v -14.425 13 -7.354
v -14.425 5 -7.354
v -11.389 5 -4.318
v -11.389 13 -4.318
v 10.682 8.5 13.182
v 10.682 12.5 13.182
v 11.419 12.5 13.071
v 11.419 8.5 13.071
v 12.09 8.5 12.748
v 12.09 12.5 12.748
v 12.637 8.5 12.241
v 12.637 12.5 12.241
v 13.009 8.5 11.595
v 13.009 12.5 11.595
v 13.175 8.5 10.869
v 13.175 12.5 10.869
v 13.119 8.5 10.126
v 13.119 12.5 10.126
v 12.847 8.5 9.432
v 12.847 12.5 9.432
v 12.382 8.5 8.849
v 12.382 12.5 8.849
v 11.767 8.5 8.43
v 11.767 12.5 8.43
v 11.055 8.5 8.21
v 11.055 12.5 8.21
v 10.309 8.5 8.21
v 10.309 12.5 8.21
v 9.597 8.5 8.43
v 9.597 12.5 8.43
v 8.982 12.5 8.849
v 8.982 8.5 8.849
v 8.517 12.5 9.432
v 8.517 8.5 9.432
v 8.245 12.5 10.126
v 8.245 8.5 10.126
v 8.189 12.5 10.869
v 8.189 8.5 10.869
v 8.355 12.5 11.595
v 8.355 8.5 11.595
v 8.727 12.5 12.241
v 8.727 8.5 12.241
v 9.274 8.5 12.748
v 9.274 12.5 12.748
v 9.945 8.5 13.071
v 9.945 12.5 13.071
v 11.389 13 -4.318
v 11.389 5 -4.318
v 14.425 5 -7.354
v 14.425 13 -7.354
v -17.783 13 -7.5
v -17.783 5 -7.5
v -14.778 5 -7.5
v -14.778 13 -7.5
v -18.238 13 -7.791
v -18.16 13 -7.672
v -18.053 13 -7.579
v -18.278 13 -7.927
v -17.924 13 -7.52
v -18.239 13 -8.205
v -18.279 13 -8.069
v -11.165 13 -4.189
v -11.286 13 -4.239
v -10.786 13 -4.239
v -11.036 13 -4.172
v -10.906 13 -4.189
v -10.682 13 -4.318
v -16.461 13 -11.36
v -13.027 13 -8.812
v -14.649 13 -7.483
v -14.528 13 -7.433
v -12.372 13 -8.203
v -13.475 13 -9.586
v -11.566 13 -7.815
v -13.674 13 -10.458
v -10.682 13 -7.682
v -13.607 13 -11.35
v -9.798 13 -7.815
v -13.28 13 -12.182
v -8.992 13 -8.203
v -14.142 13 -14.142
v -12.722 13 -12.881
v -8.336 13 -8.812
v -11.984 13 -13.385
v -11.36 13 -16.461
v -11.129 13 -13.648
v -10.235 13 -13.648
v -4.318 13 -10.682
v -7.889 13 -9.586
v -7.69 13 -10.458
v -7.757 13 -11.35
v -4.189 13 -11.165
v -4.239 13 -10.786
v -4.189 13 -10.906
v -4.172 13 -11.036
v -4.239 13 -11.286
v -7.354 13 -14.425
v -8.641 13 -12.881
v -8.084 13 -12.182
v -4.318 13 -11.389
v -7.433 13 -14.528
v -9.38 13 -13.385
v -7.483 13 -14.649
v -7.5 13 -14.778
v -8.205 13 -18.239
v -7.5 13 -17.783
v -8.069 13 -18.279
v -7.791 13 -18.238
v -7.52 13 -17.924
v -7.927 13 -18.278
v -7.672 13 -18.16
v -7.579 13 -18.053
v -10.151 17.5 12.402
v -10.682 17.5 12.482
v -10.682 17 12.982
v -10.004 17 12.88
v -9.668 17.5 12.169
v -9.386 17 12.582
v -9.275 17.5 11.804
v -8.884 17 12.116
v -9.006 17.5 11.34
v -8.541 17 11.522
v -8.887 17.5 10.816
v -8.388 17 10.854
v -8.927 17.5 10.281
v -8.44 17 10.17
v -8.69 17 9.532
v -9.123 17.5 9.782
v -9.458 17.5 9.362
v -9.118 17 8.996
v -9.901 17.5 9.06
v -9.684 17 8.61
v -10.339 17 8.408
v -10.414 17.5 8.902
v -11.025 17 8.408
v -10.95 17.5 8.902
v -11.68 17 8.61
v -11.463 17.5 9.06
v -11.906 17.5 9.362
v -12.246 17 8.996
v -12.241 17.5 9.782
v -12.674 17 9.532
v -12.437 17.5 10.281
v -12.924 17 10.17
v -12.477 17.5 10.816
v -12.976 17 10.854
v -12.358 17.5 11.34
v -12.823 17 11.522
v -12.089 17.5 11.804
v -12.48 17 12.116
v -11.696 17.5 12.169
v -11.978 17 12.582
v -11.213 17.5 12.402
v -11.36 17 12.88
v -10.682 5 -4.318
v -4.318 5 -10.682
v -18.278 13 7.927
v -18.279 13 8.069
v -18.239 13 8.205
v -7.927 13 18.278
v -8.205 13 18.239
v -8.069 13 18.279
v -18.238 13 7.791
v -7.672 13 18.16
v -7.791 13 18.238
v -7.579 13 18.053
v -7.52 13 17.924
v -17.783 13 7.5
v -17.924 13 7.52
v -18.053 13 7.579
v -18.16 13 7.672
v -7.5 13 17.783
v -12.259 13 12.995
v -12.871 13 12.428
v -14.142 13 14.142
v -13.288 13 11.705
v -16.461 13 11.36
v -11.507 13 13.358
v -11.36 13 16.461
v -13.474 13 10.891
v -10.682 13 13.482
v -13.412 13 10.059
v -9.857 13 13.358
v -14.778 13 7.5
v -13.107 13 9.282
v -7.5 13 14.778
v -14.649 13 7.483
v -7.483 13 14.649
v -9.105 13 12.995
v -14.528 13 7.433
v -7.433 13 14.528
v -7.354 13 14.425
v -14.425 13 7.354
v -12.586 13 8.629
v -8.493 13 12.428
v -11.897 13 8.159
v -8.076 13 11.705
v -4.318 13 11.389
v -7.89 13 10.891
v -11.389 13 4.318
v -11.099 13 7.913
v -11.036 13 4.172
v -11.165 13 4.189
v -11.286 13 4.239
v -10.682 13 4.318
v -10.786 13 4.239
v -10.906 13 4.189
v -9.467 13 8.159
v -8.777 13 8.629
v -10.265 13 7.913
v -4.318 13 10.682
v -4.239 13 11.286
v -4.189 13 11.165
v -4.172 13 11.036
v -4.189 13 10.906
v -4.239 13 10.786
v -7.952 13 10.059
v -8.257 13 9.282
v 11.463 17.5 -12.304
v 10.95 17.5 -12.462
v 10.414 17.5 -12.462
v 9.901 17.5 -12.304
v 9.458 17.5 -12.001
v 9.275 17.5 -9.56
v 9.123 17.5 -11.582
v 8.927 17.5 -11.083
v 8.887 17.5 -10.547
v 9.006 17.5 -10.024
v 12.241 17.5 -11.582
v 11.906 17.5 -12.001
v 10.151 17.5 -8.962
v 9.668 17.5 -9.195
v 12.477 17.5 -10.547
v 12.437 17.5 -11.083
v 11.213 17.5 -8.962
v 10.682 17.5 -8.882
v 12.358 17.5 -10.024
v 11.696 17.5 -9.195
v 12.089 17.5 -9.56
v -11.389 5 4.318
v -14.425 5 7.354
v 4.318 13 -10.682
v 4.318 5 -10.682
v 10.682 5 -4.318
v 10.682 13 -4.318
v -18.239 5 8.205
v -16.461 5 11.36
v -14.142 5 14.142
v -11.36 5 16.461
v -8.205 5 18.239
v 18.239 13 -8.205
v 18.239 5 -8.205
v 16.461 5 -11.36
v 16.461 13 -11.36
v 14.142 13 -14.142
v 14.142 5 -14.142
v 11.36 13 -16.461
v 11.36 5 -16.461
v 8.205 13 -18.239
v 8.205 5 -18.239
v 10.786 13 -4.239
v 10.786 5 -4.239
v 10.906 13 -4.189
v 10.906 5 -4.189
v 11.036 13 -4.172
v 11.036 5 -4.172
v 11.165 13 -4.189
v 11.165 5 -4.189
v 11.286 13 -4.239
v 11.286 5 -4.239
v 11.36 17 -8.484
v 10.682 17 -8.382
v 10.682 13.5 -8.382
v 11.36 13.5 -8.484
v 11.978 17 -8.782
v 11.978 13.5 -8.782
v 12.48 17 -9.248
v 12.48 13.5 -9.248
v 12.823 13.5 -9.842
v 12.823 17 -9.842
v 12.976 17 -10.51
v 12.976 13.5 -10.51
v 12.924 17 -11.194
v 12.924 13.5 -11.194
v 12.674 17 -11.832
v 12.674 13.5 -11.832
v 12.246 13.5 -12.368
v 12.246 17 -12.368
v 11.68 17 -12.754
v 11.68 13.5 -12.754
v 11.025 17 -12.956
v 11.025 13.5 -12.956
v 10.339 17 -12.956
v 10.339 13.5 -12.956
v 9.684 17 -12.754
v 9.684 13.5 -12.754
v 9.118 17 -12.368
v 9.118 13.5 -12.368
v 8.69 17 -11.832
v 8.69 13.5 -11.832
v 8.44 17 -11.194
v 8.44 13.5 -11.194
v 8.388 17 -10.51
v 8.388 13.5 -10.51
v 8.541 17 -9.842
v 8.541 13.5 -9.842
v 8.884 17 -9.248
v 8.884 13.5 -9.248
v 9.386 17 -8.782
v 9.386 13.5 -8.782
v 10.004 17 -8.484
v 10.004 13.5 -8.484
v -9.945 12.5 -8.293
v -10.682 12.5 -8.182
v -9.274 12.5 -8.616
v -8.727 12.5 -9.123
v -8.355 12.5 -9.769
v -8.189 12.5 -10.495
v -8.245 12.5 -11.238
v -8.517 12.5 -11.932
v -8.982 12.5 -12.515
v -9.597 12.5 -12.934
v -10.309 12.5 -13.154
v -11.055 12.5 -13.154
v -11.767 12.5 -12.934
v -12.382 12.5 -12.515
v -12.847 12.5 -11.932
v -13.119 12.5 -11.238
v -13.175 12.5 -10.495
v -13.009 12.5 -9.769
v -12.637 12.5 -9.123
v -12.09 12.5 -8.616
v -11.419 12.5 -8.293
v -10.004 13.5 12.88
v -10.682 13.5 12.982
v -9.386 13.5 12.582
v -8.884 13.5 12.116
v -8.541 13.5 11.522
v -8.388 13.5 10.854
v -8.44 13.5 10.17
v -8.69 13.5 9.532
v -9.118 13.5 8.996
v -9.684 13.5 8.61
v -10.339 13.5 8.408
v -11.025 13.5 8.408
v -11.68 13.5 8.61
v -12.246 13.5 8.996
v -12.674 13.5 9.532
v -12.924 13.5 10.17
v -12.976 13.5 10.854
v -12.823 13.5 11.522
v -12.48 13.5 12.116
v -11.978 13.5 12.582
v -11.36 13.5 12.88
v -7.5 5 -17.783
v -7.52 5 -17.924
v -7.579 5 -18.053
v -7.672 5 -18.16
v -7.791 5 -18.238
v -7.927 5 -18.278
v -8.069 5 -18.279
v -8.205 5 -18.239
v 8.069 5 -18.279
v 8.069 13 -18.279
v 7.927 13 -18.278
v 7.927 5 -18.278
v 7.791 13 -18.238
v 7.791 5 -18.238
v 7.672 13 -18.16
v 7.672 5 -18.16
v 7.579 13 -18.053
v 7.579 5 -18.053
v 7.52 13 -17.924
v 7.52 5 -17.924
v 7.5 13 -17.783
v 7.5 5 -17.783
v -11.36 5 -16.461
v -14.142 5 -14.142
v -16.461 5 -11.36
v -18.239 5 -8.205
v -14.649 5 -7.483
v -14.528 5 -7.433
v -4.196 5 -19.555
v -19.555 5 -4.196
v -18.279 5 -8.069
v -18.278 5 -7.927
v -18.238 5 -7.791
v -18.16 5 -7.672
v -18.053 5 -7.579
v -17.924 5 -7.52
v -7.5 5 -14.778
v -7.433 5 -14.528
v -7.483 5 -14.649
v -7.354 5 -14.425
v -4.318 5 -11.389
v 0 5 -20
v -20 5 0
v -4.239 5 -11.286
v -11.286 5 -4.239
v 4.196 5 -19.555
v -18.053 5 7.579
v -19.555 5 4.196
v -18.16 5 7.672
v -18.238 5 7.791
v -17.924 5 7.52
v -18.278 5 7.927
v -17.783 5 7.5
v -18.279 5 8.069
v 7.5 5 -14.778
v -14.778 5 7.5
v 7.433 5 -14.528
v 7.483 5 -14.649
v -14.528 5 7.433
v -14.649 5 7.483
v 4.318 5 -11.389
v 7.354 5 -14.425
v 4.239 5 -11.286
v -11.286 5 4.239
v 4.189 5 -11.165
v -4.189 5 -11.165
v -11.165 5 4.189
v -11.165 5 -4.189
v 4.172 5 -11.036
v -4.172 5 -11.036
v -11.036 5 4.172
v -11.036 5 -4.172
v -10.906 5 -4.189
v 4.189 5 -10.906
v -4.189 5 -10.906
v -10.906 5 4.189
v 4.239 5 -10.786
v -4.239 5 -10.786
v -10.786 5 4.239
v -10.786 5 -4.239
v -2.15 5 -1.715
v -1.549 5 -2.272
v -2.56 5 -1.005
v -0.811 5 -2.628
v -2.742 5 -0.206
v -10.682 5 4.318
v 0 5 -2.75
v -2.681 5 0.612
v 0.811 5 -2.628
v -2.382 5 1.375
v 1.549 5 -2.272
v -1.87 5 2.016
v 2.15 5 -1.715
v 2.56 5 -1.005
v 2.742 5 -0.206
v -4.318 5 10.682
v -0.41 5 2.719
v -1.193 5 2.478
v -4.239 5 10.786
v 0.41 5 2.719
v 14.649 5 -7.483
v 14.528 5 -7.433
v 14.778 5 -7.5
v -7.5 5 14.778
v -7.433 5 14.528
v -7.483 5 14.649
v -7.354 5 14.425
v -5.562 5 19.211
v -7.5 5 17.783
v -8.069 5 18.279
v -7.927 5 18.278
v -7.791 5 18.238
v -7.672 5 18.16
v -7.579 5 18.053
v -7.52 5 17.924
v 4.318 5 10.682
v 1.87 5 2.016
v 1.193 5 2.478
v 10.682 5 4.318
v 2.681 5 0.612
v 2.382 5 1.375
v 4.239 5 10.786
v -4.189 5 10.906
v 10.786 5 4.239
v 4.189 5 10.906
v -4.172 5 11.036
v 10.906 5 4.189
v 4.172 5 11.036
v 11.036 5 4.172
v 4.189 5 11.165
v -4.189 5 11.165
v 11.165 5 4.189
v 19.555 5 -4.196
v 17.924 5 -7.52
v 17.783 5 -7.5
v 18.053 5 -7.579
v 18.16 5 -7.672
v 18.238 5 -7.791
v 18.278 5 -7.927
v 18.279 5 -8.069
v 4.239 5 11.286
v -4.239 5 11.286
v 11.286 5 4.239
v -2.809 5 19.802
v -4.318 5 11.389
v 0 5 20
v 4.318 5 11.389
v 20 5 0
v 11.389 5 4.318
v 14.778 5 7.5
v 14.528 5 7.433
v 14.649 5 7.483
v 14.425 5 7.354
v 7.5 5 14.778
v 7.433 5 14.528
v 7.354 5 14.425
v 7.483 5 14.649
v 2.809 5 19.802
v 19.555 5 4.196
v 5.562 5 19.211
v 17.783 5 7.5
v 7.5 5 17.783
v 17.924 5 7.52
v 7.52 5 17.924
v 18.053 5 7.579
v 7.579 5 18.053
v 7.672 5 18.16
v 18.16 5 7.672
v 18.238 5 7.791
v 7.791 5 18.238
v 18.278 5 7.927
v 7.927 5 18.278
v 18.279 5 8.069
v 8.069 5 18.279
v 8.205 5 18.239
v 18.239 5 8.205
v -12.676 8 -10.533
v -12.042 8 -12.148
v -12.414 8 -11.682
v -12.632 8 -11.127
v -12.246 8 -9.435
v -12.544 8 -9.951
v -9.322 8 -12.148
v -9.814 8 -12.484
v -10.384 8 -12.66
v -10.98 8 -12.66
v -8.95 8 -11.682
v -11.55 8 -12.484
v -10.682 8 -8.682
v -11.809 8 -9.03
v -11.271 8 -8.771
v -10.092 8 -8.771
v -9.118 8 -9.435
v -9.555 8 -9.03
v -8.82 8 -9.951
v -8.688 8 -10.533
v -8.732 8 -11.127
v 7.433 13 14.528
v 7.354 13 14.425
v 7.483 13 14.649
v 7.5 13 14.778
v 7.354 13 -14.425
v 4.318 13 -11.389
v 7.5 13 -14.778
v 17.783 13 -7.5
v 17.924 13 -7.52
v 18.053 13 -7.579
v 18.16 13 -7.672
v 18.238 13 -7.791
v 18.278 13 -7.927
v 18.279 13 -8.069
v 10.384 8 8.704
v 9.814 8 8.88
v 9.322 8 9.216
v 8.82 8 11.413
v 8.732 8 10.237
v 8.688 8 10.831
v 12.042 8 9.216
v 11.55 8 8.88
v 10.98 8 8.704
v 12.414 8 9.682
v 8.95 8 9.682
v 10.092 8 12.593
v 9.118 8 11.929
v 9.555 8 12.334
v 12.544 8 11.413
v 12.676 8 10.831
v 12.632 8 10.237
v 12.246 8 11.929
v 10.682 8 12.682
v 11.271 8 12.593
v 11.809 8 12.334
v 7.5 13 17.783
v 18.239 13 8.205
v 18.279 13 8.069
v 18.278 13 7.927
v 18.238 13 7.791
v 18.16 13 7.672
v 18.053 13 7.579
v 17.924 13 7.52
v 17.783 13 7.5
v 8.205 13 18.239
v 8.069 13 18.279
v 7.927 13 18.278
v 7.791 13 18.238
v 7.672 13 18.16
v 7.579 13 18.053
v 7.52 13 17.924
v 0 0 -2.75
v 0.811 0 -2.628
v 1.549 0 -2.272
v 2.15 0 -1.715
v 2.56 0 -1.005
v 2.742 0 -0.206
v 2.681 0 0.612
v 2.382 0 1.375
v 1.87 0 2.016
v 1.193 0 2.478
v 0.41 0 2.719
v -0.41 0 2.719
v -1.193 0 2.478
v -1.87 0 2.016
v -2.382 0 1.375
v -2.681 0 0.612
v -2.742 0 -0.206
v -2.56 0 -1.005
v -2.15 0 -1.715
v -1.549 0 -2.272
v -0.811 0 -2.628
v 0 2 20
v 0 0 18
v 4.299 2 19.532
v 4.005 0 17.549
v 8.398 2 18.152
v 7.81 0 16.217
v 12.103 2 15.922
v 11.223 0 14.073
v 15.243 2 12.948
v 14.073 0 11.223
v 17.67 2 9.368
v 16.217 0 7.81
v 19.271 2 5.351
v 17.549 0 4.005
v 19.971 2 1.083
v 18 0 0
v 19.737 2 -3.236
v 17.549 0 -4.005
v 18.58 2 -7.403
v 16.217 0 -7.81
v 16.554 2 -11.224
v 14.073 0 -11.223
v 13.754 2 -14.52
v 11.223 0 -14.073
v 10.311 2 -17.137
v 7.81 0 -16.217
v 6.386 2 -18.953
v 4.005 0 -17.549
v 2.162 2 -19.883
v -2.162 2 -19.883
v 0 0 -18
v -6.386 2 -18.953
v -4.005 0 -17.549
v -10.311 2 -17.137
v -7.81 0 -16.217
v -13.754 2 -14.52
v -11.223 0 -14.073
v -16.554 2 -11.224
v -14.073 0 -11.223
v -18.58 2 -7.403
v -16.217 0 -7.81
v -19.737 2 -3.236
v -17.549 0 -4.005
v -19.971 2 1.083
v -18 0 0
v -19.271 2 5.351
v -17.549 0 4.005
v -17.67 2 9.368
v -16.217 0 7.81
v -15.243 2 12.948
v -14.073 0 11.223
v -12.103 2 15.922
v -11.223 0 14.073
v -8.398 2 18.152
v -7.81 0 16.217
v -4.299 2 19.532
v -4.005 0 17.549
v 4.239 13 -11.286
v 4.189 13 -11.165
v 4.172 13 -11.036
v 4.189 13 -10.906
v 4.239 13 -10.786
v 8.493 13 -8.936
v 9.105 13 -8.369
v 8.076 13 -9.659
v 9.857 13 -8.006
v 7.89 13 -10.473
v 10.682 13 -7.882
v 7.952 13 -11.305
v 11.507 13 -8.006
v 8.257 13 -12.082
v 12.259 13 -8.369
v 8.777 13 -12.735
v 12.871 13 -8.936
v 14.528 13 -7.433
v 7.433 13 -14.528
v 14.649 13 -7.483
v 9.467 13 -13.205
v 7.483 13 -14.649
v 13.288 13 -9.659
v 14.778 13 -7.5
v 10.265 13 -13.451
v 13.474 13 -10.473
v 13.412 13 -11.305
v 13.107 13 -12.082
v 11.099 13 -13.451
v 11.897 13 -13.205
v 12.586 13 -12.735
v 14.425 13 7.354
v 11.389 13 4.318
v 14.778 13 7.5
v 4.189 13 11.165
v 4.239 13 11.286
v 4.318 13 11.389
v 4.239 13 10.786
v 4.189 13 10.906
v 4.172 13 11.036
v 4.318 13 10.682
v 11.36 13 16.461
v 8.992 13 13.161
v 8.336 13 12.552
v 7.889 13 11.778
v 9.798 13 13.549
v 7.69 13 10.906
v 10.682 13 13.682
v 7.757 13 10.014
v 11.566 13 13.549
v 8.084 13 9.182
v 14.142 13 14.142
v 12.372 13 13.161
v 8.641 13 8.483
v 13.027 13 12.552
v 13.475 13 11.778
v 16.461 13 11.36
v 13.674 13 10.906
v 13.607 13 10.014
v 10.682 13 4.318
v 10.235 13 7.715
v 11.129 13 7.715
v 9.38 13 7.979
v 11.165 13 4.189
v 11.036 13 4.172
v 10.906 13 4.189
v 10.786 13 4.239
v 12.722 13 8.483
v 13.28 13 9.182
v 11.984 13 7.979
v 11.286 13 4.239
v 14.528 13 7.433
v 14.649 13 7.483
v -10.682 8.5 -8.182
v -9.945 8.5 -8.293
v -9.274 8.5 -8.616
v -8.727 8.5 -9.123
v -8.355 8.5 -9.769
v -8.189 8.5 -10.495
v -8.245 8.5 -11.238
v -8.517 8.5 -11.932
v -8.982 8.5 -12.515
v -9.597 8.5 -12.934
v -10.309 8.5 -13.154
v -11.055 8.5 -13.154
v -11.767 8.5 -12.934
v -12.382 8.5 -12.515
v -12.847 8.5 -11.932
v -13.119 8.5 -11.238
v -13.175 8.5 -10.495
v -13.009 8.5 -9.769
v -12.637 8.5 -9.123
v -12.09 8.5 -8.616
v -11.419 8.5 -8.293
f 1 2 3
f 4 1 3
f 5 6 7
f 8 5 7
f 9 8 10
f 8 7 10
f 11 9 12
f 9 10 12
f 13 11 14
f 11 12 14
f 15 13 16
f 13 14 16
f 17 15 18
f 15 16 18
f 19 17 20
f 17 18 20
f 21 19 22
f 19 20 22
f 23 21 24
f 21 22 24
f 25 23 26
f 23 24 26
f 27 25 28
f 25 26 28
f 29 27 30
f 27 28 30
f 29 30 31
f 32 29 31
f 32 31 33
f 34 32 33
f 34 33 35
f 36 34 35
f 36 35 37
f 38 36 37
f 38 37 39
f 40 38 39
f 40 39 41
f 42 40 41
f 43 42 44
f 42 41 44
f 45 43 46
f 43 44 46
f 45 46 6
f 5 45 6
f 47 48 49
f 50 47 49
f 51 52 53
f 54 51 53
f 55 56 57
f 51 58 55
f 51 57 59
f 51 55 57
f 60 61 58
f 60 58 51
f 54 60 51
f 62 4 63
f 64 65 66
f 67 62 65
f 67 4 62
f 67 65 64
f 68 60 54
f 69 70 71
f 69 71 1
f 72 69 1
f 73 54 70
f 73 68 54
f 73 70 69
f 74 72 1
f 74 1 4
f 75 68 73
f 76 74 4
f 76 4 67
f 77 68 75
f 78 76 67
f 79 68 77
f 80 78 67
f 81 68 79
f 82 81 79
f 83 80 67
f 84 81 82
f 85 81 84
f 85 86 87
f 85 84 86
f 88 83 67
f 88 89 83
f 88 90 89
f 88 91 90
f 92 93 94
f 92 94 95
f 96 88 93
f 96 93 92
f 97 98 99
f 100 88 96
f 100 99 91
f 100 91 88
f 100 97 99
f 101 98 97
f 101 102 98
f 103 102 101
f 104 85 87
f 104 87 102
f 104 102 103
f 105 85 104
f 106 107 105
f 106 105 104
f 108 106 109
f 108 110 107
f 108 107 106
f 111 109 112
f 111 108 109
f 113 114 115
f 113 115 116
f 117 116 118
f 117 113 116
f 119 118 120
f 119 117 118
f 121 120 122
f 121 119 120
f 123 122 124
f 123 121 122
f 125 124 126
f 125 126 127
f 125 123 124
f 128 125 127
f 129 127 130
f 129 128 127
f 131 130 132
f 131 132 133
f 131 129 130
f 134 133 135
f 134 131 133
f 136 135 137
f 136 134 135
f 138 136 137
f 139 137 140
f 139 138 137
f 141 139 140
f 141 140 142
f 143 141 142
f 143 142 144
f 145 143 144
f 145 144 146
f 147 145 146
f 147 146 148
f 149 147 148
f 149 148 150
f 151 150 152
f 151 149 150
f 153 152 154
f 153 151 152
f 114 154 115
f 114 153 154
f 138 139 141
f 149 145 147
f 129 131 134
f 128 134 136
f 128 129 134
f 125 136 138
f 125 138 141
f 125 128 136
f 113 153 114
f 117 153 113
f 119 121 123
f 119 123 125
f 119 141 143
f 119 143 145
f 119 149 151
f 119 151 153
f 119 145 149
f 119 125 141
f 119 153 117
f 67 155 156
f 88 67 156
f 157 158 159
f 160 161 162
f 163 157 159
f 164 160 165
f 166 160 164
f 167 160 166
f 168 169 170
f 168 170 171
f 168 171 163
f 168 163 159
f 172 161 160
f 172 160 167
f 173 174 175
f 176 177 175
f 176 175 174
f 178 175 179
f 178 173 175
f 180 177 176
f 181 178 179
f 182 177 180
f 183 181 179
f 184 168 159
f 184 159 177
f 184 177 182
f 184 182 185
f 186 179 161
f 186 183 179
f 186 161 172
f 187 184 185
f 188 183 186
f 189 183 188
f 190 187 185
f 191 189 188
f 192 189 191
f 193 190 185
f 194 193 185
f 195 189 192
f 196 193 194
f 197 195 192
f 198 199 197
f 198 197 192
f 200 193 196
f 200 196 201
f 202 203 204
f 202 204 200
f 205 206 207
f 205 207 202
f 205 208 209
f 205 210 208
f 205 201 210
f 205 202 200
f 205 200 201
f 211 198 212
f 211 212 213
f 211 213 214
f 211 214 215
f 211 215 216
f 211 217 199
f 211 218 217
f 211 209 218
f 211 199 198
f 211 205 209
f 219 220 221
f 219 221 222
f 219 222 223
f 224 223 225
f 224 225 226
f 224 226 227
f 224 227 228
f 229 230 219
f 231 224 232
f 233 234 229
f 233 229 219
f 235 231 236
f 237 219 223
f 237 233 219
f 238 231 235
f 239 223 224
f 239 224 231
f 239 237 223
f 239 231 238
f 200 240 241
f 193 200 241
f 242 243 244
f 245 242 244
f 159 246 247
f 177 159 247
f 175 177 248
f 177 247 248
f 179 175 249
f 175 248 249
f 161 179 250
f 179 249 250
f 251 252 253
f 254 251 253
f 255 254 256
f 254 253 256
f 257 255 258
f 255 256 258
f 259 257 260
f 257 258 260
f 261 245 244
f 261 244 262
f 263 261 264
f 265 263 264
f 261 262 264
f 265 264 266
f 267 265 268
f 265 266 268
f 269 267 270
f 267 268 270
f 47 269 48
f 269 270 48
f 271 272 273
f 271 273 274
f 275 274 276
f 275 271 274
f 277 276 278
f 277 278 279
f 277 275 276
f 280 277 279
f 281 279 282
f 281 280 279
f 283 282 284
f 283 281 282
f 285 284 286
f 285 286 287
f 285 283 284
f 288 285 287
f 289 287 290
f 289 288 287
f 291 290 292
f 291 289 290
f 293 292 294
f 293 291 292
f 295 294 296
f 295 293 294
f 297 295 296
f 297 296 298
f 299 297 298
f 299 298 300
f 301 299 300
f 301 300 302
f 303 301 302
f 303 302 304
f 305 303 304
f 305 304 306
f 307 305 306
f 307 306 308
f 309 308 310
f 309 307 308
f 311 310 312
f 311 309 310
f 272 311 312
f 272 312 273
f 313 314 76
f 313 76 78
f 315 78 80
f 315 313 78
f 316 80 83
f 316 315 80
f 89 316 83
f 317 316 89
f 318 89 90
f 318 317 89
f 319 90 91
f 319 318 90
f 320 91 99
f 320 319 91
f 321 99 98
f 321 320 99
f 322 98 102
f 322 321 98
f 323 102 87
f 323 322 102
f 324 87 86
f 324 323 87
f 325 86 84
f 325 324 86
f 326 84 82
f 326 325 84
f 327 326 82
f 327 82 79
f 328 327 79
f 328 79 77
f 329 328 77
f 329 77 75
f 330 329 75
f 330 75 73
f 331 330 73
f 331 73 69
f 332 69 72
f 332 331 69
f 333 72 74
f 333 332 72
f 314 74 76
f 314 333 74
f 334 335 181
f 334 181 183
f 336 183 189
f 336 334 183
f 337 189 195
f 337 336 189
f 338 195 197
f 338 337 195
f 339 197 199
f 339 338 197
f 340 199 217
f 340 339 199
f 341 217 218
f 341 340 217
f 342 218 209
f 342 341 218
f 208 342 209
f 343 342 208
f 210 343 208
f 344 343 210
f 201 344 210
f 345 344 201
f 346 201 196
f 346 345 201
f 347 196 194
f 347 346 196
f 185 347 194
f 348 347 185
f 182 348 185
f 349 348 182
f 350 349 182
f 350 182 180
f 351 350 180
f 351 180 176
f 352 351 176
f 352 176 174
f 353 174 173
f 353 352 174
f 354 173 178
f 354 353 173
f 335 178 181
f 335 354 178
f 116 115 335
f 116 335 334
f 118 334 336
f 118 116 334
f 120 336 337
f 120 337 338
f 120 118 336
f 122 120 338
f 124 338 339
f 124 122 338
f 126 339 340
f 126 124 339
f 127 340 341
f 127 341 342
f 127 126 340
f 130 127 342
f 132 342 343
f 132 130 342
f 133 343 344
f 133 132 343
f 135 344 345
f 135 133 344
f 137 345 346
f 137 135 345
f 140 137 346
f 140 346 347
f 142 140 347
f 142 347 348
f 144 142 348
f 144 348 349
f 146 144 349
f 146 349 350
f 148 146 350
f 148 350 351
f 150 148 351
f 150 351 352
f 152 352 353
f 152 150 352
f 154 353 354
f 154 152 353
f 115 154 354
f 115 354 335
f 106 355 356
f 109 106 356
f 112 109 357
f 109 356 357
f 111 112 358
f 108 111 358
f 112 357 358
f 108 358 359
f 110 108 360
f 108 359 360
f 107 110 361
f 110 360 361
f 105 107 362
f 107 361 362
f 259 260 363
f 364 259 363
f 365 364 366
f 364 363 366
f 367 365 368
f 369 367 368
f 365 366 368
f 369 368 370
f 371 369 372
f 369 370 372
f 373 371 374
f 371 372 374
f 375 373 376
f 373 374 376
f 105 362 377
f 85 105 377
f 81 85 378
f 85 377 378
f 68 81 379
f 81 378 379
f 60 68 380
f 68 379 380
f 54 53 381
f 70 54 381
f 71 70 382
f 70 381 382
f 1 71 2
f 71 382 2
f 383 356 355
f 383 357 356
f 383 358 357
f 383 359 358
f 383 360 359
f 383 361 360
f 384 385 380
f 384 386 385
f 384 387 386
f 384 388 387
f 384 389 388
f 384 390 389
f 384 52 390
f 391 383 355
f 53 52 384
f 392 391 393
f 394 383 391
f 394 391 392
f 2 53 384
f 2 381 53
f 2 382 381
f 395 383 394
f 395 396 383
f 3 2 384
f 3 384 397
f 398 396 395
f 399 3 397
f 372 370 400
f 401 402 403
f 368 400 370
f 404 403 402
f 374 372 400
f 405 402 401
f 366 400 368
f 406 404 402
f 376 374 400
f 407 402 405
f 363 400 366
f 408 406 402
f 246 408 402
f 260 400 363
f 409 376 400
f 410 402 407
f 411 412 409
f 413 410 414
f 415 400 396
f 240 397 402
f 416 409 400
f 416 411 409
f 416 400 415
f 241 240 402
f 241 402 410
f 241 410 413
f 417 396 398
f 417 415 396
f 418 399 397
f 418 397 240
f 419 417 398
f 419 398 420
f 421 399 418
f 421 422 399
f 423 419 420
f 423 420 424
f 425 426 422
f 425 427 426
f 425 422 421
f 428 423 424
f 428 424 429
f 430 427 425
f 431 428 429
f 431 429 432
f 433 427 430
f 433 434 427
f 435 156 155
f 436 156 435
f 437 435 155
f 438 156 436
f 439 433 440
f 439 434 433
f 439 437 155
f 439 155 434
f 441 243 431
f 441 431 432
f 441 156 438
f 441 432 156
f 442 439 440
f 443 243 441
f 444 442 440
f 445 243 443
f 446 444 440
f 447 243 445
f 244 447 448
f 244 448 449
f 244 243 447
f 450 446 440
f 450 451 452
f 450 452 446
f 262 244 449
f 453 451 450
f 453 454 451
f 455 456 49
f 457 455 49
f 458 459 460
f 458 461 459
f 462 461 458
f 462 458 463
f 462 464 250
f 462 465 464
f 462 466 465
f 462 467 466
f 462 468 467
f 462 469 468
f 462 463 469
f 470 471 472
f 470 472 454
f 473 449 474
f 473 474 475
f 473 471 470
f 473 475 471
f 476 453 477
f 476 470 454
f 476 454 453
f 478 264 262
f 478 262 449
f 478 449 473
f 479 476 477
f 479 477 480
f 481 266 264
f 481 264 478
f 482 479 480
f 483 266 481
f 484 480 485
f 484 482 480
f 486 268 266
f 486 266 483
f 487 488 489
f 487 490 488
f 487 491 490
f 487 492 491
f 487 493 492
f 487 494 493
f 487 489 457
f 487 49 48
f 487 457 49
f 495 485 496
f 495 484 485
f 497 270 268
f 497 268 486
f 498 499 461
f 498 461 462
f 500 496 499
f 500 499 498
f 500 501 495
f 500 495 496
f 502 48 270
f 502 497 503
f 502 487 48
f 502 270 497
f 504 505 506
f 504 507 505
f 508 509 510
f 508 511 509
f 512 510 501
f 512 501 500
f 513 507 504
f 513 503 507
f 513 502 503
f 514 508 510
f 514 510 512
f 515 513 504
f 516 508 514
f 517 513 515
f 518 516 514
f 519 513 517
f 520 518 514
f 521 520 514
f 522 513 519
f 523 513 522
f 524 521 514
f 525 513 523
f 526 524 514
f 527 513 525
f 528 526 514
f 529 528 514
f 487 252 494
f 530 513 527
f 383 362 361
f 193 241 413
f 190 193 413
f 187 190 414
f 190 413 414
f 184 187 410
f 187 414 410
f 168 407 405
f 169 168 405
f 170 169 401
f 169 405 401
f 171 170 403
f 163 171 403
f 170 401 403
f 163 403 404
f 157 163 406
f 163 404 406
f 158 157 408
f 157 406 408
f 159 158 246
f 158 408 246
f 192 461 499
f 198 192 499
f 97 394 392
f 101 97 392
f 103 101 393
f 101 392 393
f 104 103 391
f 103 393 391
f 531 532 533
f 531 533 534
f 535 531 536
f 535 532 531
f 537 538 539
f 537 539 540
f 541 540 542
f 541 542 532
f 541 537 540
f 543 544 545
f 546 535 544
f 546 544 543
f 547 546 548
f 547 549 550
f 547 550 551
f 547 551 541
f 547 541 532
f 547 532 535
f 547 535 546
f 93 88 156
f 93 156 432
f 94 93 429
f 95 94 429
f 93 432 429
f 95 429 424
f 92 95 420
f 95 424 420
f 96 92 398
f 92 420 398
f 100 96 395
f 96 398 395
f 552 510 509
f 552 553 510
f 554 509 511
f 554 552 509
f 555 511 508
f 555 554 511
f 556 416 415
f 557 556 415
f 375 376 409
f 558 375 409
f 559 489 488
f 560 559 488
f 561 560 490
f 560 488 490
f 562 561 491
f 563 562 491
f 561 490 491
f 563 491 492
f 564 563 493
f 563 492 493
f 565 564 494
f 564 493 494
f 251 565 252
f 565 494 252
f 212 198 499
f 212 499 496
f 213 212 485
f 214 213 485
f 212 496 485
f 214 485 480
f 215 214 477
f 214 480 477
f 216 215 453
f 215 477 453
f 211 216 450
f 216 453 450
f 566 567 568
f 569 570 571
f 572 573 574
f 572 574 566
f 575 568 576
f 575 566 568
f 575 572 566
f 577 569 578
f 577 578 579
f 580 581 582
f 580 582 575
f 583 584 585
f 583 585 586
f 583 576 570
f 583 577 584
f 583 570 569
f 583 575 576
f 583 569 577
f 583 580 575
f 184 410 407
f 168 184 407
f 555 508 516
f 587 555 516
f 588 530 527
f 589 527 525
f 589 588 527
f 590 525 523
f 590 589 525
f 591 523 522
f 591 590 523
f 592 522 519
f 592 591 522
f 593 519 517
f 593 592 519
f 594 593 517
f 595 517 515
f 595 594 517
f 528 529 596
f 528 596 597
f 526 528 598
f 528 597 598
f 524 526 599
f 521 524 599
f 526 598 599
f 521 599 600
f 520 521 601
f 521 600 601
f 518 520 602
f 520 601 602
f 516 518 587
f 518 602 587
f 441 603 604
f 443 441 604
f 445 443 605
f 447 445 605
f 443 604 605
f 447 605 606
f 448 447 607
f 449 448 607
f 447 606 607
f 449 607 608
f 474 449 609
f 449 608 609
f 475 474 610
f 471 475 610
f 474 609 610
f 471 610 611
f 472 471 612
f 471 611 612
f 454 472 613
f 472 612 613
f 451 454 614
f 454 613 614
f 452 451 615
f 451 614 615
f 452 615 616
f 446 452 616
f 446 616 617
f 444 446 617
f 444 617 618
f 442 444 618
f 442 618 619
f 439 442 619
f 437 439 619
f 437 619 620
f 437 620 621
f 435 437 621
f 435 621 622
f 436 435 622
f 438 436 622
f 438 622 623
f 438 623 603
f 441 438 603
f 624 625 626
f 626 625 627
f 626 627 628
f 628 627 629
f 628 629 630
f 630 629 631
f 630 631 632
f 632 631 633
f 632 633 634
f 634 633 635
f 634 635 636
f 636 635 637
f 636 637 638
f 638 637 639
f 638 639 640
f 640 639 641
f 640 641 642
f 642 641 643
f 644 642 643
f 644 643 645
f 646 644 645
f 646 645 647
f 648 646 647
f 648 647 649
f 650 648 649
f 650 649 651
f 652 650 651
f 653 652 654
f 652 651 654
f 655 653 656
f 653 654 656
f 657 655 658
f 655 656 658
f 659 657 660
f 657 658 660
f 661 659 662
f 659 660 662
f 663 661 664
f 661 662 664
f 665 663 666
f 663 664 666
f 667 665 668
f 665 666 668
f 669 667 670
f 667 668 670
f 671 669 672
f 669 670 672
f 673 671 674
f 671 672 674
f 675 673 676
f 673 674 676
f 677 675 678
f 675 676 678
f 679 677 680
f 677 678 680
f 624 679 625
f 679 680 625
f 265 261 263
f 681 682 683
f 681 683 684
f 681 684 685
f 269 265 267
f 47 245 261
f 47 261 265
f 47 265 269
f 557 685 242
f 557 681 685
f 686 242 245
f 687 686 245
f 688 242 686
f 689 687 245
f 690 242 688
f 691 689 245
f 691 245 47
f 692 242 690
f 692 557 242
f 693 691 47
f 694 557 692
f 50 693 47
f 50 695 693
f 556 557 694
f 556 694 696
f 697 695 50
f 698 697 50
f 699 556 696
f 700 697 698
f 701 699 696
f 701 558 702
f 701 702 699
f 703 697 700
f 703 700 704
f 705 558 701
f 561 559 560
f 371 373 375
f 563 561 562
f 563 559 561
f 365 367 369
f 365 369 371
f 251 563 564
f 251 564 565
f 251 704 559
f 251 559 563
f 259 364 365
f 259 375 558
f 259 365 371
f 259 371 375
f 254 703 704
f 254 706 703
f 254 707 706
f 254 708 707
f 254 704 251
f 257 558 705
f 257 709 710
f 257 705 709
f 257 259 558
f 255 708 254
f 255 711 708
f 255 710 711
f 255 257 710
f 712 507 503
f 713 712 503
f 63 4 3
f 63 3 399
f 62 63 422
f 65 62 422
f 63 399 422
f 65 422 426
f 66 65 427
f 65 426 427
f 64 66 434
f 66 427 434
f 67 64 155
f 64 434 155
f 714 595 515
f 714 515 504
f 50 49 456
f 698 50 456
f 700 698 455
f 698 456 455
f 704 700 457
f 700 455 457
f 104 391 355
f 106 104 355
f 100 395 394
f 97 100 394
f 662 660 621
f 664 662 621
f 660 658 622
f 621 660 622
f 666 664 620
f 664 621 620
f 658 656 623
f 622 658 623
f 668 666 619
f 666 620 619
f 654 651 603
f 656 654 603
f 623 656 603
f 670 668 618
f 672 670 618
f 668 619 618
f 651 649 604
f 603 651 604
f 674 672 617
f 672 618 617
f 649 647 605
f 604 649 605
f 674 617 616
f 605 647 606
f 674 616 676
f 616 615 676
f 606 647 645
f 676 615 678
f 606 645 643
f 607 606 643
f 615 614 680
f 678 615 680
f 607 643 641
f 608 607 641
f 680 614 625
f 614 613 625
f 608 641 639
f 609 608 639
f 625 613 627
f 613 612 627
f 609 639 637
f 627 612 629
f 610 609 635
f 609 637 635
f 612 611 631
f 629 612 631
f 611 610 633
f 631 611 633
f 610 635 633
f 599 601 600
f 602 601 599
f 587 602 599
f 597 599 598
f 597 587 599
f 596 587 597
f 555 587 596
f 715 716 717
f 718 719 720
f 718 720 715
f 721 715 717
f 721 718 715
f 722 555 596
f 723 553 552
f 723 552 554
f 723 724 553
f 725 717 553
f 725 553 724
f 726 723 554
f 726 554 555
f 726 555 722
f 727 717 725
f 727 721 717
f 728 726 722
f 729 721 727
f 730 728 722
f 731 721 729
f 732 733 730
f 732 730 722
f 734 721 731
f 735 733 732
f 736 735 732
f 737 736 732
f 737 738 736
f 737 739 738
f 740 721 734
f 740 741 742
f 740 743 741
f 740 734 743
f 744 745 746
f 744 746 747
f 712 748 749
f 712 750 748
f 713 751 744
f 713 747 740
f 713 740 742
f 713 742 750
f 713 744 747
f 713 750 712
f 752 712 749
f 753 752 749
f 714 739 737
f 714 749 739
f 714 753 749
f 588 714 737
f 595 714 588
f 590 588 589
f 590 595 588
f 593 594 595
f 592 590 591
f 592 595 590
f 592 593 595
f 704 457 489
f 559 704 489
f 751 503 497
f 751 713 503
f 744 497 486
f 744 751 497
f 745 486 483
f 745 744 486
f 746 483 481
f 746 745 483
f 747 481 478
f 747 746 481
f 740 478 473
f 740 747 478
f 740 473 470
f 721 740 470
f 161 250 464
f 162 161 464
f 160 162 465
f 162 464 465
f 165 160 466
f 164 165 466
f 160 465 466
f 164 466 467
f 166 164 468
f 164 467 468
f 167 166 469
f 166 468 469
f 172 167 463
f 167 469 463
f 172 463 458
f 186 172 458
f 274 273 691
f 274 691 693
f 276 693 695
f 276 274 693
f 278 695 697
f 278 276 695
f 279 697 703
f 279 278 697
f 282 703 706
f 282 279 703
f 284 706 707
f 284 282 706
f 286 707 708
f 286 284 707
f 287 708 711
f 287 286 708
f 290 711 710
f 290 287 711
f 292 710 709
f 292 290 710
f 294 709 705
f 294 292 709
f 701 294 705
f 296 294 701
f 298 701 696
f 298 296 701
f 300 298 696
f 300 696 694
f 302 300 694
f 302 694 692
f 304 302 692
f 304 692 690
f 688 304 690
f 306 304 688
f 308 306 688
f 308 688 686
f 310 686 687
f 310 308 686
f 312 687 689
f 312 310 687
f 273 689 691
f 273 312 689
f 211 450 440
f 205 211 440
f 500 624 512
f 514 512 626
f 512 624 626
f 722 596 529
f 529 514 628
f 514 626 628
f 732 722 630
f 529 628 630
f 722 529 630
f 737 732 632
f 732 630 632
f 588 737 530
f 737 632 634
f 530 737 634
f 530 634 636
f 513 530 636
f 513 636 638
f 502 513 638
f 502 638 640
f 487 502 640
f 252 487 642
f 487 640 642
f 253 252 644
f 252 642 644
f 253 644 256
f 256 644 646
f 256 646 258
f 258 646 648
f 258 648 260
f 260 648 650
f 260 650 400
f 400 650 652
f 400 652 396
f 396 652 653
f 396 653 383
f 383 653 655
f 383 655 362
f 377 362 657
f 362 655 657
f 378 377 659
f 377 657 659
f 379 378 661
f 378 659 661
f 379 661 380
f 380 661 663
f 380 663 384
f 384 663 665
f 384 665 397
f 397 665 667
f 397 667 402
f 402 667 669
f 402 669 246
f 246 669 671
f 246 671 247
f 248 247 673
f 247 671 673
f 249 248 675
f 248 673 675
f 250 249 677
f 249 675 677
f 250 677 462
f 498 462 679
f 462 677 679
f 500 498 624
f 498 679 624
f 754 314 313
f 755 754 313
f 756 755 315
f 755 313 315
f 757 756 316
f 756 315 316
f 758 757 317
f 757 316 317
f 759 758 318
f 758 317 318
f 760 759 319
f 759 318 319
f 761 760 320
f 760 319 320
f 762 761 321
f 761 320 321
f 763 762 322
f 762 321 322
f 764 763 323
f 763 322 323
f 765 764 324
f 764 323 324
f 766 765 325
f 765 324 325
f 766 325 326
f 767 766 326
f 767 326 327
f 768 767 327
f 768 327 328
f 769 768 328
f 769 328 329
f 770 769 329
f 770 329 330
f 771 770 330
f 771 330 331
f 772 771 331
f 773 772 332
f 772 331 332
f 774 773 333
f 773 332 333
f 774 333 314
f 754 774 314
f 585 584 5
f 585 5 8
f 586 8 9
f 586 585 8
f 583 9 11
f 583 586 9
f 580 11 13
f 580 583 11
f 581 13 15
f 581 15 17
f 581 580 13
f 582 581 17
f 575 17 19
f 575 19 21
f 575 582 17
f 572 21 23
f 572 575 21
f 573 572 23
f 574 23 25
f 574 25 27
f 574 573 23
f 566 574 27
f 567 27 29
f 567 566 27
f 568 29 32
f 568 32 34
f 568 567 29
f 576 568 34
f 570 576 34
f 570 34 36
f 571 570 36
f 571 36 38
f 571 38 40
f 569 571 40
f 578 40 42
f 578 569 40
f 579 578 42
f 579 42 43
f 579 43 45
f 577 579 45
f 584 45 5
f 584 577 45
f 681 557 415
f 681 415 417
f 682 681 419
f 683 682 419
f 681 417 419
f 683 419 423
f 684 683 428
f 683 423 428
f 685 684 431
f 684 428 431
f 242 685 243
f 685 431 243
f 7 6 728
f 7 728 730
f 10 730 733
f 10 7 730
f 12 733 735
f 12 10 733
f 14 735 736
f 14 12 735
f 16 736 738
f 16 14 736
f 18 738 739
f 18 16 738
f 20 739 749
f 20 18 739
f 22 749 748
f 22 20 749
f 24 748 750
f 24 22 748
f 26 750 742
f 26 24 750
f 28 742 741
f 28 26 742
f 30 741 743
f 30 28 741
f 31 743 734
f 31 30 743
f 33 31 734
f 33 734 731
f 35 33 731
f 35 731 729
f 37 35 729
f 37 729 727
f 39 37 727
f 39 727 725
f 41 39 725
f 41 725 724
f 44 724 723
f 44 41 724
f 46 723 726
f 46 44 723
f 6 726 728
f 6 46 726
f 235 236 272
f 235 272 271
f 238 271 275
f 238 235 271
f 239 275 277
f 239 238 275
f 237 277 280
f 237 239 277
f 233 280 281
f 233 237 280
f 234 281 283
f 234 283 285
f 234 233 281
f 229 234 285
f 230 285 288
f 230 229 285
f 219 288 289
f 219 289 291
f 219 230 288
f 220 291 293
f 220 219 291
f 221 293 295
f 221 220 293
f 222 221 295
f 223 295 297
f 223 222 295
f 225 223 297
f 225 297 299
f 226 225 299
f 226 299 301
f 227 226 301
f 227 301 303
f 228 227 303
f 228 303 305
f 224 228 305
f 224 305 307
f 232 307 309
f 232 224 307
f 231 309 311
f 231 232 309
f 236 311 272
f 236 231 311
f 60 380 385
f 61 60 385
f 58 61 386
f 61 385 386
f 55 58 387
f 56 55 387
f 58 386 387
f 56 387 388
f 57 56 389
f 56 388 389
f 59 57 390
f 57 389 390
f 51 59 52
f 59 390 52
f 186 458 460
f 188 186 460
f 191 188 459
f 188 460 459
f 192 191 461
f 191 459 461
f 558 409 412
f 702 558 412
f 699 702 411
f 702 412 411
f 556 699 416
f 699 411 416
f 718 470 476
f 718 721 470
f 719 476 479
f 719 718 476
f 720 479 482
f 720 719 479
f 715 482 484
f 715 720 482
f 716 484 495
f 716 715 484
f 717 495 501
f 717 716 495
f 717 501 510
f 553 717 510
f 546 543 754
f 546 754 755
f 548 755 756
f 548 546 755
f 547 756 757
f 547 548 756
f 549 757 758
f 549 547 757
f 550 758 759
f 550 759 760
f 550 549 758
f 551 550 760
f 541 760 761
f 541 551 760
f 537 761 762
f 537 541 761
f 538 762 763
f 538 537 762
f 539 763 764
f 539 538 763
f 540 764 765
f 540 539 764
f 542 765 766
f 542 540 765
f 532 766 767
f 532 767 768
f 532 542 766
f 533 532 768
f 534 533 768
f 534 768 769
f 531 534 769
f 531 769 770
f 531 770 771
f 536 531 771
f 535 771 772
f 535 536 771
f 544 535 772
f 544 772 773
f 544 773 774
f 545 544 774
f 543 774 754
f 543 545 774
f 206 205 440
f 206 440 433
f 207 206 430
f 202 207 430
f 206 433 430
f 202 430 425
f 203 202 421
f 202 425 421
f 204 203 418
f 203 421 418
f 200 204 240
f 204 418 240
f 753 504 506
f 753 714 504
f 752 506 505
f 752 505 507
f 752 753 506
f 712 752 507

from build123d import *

# Parameters (mm, degrees)
SKETCH_1_R               = 20
EXTRUDE_1_DEPTH          = 5
EXTRUDE_2_DEPTH          = 8
FILLET_1_R               = 0.5
PATTERN_START            = 5
PATTERN_CIRCULAR_1_DEPTH = 8
SKETCH_3_R               = 2.5000000000000004
CUT_EXTRUDE_1_DEPTH      = 5
EXTRUDE_START            = 4.5
SKETCH_3_3_R             = 2.5000000000000004
SKETCH_3_3_R_2           = 2.2999999999999994
EXTRUDE_3_DEPTH          = 4.5
CHAMFER_1_SIZE           = 0.5
SKETCH_4_R               = 2.75
CUT_EXTRUDE_2_DEPTH      = 34.26033673912518
CHAMFER_2_SIZE           = 2


# Read off the part's stored shape, not the designer's step: 阵列(圆周)1
with BuildPart() as part:
    # 草图1 → 凸台-拉伸1 (new body)
    with BuildSketch(Plane(origin=(0, 0, 0), x_dir=(1, 0, 0), z_dir=(0, 1, 0))):
        with Locations(Location((0, 0, 0), (0, 0, 270))):
            Circle(SKETCH_1_R)
    extrude(amount=EXTRUDE_1_DEPTH)

    # 草图2 → 凸台-拉伸2 (add)
    with BuildSketch(Plane(origin=(0, 5, 0), x_dir=(1, 0, 0), z_dir=(0, 1, 0))):
        with BuildLine():
            Line((14.57106781186547, -7.500000000000001), (11.035533905932741, -3.9644660940672627))
            Line((11.035533905932741, -3.9644660940672627), (3.9644660940672627, -11.03553390593274))
            Line((3.9644660940672627, -11.03553390593274), (7.500000000000001, -14.571067811865477))
            Line((7.500000000000001, -14.571067811865477), (7.500000000000001, -18.540496217739157))
            ThreePointArc((7.500000000000001, -18.540496217739157), (14.142135623730951, -14.14213562373095), (18.540496217739157, -7.500000000000001))
            Line((18.540496217739157, -7.500000000000001), (14.57106781186547, -7.500000000000001))
        make_face()
    extrude(amount=EXTRUDE_2_DEPTH)

    # 圆角1
    fillet_1_edges = [part.edges().sort_by_distance(p)[0] for p in [
        (7.500000000000001, 9, 14.571067811865477),
        (7.500000000000001, 9, 18.540496217739157),
        (18.540496217739154, 9, 7.500000000000002),
        (14.57106781186547, 9, 7.500000000000001),
        (11.035533905932741, 9, 3.9644660940672627),
        (3.9644660940672627, 9, 11.03553390593274),
    ]]
    fillet(fillet_1_edges, radius=FILLET_1_R)

    # 阵列(圆周)1 outline → 阵列(圆周)1 (add)
    with BuildSketch(Plane(origin=(0, 0, 0), x_dir=(1, 0, 0), z_dir=(0, 1, 0)).offset(PATTERN_START)):
        with BuildLine():
            ThreePointArc((17.783419244, 7.5), (18.203278805, 7.728489505), (18.239404353, 8.205128205))
            ThreePointArc((18.239404353, 8.205128205), (14.142135624, 14.142135624), (8.205128205, 18.239404353))
            ThreePointArc((8.205128205, 18.239404353), (7.728489505, 18.203278805), (7.5, 17.783419244))
            Line((7.5, 17.783419244), (7.5, 14.778174593))
            ThreePointArc((7.5, 14.778174593), (7.461939766, 14.586832877), (7.353553391, 14.424621202))
            Line((7.353553391, 14.424621202), (4.318019485, 11.389087297))
            ThreePointArc((4.318019485, 11.389087297), (4.171572875, 11.035533906), (4.318019485, 10.681980515))
            Line((4.318019485, 10.681980515), (10.681980515, 4.318019485))
            ThreePointArc((10.681980515, 4.318019485), (11.035533906, 4.171572875), (11.389087297, 4.318019485))
            Line((11.389087297, 4.318019485), (14.424621202, 7.353553391))
            ThreePointArc((14.424621202, 7.353553391), (14.586832877, 7.461939766), (14.778174593, 7.5))
            Line((14.778174593, 7.5), (17.783419244, 7.5))
        make_face()
        with BuildLine():
            ThreePointArc((-18.239404353, -8.205128205), (-14.142135624, -14.142135624), (-8.205128205, -18.239404353))
            ThreePointArc((-8.205128205, -18.239404353), (-7.728489505, -18.203278805), (-7.5, -17.783419244))
            Line((-7.5, -17.783419244), (-7.5, -14.778174593))
            ThreePointArc((-7.5, -14.778174593), (-7.461939766, -14.586832877), (-7.353553391, -14.424621202))
            Line((-7.353553391, -14.424621202), (-4.318019485, -11.389087297))
            ThreePointArc((-4.318019485, -11.389087297), (-4.171572875, -11.035533906), (-4.318019485, -10.681980515))
            Line((-4.318019485, -10.681980515), (-10.681980515, -4.318019485))
            ThreePointArc((-10.681980515, -4.318019485), (-11.035533906, -4.171572875), (-11.389087297, -4.318019485))
            Line((-11.389087297, -4.318019485), (-14.424621202, -7.353553391))
            ThreePointArc((-14.424621202, -7.353553391), (-14.586832877, -7.461939766), (-14.778174593, -7.5))
            Line((-14.778174593, -7.5), (-17.783419244, -7.5))
            ThreePointArc((-17.783419244, -7.5), (-18.203278805, -7.728489505), (-18.239404353, -8.205128205))
        make_face()
        with BuildLine():
            ThreePointArc((-7.5, 17.783419244), (-7.728489505, 18.203278805), (-8.205128205, 18.239404353))
            ThreePointArc((-8.205128205, 18.239404353), (-14.142135624, 14.142135624), (-18.239404353, 8.205128205))
            ThreePointArc((-18.239404353, 8.205128205), (-18.203278805, 7.728489505), (-17.783419244, 7.5))
            Line((-17.783419244, 7.5), (-14.778174593, 7.5))
            ThreePointArc((-14.778174593, 7.5), (-14.586832877, 7.461939766), (-14.424621202, 7.353553391))
            Line((-14.424621202, 7.353553391), (-11.389087297, 4.318019485))
            ThreePointArc((-11.389087297, 4.318019485), (-11.035533906, 4.171572875), (-10.681980515, 4.318019485))
            Line((-10.681980515, 4.318019485), (-4.318019485, 10.681980515))
            ThreePointArc((-4.318019485, 10.681980515), (-4.171572875, 11.035533906), (-4.318019485, 11.389087297))
            Line((-4.318019485, 11.389087297), (-7.353553391, 14.424621202))
            ThreePointArc((-7.353553391, 14.424621202), (-7.461939766, 14.586832877), (-7.5, 14.778174593))
            Line((-7.5, 14.778174593), (-7.5, 17.783419244))
        make_face()
    extrude(amount=PATTERN_CIRCULAR_1_DEPTH)

    # 草图3 → 切除-拉伸1 (cut)
    with BuildSketch(Plane(origin=(0, 13.000000000000002, 0), x_dir=(1, 0, 0), z_dir=(0, 1, 0))):
        with Locations(Location((-10.681980515339466, 10.681980515339463, 0), (0, 0, 270))):
            Circle(SKETCH_3_R)
        with Locations(Location((10.681980515339466, -10.681980515339463, 0), (0, 0, 270))):
            Circle(SKETCH_3_R)
    extrude(amount=-CUT_EXTRUDE_1_DEPTH, mode=Mode.SUBTRACT)

    # 草图3<3> → 凸台-拉伸3 (add)
    with BuildSketch(Plane(origin=(0, 13.000000000000002, 0), x_dir=(1, 0, 0), z_dir=(0, 1, 0)).offset(EXTRUDE_START)):
        with Locations(Location((10.681980515339466, -10.681980515339463, 0), (0, 0, 270))):
            Circle(SKETCH_3_3_R)
        with Locations(Location((-10.681980515339466, 10.681980515339463, 0), (0, 0, 270))):
            Circle(SKETCH_3_3_R)
        with Locations(Location((10.681980515339466, 10.681980515339463, 0), (0, 0, 270))):
            Circle(SKETCH_3_3_R_2)
        with Locations(Location((-10.681980515339465, -10.681980515339465, 0), (0, 0, 270))):
            Circle(SKETCH_3_3_R_2)
    extrude(amount=-EXTRUDE_3_DEPTH)


with BuildPart() as extrude_3_kept_piece:
    # of the separate pieces the step leaves, the one the design keeps (extrude_3_pieces_kept)
    add(part.part.solids().sort_by_distance((8.205128205, 5, 18.239404353))[0])

    # 倒角1
    chamfer_1_edges = [extrude_3_kept_piece.edges().sort_by_distance(p)[0] for p in [
        (-10.681980515339466, 8.000000000000002, -13.181980515339463),
        (-10.681980515339466, 13.000000000000002, -13.181980515339463),
        (10.681980515339466, 8.000000000000002, 8.181980515339463),
        (10.681980515339466, 13.000000000000002, 8.181980515339463),
        (10.681980515339466, 13.000000000000002, -12.981980515339462),
        (10.681980515339466, 17.5, -12.981980515339462),
        (-10.681980515339465, 13.000000000000002, 8.381980515339466),
        (-10.681980515339465, 17.5, 8.381980515339466),
    ]]
    chamfer(chamfer_1_edges, length=CHAMFER_1_SIZE)

    # 草图4 → 切除-拉伸2 (cut, through all)
    with BuildSketch(Plane.XZ):
        with Locations(Location((0, 0, 0), (0, 0, 270))):
            Circle(SKETCH_4_R)
    extrude(amount=-CUT_EXTRUDE_2_DEPTH, mode=Mode.SUBTRACT)

    # 倒角2
    chamfer_2_edges = [extrude_3_kept_piece.edges().sort_by_distance(p)[0] for p in [
        (6.12e-15, 0, -20),
    ]]
    chamfer(chamfer_2_edges, length=CHAMFER_2_SIZE)


solid = extrude_3_kept_piece.part
